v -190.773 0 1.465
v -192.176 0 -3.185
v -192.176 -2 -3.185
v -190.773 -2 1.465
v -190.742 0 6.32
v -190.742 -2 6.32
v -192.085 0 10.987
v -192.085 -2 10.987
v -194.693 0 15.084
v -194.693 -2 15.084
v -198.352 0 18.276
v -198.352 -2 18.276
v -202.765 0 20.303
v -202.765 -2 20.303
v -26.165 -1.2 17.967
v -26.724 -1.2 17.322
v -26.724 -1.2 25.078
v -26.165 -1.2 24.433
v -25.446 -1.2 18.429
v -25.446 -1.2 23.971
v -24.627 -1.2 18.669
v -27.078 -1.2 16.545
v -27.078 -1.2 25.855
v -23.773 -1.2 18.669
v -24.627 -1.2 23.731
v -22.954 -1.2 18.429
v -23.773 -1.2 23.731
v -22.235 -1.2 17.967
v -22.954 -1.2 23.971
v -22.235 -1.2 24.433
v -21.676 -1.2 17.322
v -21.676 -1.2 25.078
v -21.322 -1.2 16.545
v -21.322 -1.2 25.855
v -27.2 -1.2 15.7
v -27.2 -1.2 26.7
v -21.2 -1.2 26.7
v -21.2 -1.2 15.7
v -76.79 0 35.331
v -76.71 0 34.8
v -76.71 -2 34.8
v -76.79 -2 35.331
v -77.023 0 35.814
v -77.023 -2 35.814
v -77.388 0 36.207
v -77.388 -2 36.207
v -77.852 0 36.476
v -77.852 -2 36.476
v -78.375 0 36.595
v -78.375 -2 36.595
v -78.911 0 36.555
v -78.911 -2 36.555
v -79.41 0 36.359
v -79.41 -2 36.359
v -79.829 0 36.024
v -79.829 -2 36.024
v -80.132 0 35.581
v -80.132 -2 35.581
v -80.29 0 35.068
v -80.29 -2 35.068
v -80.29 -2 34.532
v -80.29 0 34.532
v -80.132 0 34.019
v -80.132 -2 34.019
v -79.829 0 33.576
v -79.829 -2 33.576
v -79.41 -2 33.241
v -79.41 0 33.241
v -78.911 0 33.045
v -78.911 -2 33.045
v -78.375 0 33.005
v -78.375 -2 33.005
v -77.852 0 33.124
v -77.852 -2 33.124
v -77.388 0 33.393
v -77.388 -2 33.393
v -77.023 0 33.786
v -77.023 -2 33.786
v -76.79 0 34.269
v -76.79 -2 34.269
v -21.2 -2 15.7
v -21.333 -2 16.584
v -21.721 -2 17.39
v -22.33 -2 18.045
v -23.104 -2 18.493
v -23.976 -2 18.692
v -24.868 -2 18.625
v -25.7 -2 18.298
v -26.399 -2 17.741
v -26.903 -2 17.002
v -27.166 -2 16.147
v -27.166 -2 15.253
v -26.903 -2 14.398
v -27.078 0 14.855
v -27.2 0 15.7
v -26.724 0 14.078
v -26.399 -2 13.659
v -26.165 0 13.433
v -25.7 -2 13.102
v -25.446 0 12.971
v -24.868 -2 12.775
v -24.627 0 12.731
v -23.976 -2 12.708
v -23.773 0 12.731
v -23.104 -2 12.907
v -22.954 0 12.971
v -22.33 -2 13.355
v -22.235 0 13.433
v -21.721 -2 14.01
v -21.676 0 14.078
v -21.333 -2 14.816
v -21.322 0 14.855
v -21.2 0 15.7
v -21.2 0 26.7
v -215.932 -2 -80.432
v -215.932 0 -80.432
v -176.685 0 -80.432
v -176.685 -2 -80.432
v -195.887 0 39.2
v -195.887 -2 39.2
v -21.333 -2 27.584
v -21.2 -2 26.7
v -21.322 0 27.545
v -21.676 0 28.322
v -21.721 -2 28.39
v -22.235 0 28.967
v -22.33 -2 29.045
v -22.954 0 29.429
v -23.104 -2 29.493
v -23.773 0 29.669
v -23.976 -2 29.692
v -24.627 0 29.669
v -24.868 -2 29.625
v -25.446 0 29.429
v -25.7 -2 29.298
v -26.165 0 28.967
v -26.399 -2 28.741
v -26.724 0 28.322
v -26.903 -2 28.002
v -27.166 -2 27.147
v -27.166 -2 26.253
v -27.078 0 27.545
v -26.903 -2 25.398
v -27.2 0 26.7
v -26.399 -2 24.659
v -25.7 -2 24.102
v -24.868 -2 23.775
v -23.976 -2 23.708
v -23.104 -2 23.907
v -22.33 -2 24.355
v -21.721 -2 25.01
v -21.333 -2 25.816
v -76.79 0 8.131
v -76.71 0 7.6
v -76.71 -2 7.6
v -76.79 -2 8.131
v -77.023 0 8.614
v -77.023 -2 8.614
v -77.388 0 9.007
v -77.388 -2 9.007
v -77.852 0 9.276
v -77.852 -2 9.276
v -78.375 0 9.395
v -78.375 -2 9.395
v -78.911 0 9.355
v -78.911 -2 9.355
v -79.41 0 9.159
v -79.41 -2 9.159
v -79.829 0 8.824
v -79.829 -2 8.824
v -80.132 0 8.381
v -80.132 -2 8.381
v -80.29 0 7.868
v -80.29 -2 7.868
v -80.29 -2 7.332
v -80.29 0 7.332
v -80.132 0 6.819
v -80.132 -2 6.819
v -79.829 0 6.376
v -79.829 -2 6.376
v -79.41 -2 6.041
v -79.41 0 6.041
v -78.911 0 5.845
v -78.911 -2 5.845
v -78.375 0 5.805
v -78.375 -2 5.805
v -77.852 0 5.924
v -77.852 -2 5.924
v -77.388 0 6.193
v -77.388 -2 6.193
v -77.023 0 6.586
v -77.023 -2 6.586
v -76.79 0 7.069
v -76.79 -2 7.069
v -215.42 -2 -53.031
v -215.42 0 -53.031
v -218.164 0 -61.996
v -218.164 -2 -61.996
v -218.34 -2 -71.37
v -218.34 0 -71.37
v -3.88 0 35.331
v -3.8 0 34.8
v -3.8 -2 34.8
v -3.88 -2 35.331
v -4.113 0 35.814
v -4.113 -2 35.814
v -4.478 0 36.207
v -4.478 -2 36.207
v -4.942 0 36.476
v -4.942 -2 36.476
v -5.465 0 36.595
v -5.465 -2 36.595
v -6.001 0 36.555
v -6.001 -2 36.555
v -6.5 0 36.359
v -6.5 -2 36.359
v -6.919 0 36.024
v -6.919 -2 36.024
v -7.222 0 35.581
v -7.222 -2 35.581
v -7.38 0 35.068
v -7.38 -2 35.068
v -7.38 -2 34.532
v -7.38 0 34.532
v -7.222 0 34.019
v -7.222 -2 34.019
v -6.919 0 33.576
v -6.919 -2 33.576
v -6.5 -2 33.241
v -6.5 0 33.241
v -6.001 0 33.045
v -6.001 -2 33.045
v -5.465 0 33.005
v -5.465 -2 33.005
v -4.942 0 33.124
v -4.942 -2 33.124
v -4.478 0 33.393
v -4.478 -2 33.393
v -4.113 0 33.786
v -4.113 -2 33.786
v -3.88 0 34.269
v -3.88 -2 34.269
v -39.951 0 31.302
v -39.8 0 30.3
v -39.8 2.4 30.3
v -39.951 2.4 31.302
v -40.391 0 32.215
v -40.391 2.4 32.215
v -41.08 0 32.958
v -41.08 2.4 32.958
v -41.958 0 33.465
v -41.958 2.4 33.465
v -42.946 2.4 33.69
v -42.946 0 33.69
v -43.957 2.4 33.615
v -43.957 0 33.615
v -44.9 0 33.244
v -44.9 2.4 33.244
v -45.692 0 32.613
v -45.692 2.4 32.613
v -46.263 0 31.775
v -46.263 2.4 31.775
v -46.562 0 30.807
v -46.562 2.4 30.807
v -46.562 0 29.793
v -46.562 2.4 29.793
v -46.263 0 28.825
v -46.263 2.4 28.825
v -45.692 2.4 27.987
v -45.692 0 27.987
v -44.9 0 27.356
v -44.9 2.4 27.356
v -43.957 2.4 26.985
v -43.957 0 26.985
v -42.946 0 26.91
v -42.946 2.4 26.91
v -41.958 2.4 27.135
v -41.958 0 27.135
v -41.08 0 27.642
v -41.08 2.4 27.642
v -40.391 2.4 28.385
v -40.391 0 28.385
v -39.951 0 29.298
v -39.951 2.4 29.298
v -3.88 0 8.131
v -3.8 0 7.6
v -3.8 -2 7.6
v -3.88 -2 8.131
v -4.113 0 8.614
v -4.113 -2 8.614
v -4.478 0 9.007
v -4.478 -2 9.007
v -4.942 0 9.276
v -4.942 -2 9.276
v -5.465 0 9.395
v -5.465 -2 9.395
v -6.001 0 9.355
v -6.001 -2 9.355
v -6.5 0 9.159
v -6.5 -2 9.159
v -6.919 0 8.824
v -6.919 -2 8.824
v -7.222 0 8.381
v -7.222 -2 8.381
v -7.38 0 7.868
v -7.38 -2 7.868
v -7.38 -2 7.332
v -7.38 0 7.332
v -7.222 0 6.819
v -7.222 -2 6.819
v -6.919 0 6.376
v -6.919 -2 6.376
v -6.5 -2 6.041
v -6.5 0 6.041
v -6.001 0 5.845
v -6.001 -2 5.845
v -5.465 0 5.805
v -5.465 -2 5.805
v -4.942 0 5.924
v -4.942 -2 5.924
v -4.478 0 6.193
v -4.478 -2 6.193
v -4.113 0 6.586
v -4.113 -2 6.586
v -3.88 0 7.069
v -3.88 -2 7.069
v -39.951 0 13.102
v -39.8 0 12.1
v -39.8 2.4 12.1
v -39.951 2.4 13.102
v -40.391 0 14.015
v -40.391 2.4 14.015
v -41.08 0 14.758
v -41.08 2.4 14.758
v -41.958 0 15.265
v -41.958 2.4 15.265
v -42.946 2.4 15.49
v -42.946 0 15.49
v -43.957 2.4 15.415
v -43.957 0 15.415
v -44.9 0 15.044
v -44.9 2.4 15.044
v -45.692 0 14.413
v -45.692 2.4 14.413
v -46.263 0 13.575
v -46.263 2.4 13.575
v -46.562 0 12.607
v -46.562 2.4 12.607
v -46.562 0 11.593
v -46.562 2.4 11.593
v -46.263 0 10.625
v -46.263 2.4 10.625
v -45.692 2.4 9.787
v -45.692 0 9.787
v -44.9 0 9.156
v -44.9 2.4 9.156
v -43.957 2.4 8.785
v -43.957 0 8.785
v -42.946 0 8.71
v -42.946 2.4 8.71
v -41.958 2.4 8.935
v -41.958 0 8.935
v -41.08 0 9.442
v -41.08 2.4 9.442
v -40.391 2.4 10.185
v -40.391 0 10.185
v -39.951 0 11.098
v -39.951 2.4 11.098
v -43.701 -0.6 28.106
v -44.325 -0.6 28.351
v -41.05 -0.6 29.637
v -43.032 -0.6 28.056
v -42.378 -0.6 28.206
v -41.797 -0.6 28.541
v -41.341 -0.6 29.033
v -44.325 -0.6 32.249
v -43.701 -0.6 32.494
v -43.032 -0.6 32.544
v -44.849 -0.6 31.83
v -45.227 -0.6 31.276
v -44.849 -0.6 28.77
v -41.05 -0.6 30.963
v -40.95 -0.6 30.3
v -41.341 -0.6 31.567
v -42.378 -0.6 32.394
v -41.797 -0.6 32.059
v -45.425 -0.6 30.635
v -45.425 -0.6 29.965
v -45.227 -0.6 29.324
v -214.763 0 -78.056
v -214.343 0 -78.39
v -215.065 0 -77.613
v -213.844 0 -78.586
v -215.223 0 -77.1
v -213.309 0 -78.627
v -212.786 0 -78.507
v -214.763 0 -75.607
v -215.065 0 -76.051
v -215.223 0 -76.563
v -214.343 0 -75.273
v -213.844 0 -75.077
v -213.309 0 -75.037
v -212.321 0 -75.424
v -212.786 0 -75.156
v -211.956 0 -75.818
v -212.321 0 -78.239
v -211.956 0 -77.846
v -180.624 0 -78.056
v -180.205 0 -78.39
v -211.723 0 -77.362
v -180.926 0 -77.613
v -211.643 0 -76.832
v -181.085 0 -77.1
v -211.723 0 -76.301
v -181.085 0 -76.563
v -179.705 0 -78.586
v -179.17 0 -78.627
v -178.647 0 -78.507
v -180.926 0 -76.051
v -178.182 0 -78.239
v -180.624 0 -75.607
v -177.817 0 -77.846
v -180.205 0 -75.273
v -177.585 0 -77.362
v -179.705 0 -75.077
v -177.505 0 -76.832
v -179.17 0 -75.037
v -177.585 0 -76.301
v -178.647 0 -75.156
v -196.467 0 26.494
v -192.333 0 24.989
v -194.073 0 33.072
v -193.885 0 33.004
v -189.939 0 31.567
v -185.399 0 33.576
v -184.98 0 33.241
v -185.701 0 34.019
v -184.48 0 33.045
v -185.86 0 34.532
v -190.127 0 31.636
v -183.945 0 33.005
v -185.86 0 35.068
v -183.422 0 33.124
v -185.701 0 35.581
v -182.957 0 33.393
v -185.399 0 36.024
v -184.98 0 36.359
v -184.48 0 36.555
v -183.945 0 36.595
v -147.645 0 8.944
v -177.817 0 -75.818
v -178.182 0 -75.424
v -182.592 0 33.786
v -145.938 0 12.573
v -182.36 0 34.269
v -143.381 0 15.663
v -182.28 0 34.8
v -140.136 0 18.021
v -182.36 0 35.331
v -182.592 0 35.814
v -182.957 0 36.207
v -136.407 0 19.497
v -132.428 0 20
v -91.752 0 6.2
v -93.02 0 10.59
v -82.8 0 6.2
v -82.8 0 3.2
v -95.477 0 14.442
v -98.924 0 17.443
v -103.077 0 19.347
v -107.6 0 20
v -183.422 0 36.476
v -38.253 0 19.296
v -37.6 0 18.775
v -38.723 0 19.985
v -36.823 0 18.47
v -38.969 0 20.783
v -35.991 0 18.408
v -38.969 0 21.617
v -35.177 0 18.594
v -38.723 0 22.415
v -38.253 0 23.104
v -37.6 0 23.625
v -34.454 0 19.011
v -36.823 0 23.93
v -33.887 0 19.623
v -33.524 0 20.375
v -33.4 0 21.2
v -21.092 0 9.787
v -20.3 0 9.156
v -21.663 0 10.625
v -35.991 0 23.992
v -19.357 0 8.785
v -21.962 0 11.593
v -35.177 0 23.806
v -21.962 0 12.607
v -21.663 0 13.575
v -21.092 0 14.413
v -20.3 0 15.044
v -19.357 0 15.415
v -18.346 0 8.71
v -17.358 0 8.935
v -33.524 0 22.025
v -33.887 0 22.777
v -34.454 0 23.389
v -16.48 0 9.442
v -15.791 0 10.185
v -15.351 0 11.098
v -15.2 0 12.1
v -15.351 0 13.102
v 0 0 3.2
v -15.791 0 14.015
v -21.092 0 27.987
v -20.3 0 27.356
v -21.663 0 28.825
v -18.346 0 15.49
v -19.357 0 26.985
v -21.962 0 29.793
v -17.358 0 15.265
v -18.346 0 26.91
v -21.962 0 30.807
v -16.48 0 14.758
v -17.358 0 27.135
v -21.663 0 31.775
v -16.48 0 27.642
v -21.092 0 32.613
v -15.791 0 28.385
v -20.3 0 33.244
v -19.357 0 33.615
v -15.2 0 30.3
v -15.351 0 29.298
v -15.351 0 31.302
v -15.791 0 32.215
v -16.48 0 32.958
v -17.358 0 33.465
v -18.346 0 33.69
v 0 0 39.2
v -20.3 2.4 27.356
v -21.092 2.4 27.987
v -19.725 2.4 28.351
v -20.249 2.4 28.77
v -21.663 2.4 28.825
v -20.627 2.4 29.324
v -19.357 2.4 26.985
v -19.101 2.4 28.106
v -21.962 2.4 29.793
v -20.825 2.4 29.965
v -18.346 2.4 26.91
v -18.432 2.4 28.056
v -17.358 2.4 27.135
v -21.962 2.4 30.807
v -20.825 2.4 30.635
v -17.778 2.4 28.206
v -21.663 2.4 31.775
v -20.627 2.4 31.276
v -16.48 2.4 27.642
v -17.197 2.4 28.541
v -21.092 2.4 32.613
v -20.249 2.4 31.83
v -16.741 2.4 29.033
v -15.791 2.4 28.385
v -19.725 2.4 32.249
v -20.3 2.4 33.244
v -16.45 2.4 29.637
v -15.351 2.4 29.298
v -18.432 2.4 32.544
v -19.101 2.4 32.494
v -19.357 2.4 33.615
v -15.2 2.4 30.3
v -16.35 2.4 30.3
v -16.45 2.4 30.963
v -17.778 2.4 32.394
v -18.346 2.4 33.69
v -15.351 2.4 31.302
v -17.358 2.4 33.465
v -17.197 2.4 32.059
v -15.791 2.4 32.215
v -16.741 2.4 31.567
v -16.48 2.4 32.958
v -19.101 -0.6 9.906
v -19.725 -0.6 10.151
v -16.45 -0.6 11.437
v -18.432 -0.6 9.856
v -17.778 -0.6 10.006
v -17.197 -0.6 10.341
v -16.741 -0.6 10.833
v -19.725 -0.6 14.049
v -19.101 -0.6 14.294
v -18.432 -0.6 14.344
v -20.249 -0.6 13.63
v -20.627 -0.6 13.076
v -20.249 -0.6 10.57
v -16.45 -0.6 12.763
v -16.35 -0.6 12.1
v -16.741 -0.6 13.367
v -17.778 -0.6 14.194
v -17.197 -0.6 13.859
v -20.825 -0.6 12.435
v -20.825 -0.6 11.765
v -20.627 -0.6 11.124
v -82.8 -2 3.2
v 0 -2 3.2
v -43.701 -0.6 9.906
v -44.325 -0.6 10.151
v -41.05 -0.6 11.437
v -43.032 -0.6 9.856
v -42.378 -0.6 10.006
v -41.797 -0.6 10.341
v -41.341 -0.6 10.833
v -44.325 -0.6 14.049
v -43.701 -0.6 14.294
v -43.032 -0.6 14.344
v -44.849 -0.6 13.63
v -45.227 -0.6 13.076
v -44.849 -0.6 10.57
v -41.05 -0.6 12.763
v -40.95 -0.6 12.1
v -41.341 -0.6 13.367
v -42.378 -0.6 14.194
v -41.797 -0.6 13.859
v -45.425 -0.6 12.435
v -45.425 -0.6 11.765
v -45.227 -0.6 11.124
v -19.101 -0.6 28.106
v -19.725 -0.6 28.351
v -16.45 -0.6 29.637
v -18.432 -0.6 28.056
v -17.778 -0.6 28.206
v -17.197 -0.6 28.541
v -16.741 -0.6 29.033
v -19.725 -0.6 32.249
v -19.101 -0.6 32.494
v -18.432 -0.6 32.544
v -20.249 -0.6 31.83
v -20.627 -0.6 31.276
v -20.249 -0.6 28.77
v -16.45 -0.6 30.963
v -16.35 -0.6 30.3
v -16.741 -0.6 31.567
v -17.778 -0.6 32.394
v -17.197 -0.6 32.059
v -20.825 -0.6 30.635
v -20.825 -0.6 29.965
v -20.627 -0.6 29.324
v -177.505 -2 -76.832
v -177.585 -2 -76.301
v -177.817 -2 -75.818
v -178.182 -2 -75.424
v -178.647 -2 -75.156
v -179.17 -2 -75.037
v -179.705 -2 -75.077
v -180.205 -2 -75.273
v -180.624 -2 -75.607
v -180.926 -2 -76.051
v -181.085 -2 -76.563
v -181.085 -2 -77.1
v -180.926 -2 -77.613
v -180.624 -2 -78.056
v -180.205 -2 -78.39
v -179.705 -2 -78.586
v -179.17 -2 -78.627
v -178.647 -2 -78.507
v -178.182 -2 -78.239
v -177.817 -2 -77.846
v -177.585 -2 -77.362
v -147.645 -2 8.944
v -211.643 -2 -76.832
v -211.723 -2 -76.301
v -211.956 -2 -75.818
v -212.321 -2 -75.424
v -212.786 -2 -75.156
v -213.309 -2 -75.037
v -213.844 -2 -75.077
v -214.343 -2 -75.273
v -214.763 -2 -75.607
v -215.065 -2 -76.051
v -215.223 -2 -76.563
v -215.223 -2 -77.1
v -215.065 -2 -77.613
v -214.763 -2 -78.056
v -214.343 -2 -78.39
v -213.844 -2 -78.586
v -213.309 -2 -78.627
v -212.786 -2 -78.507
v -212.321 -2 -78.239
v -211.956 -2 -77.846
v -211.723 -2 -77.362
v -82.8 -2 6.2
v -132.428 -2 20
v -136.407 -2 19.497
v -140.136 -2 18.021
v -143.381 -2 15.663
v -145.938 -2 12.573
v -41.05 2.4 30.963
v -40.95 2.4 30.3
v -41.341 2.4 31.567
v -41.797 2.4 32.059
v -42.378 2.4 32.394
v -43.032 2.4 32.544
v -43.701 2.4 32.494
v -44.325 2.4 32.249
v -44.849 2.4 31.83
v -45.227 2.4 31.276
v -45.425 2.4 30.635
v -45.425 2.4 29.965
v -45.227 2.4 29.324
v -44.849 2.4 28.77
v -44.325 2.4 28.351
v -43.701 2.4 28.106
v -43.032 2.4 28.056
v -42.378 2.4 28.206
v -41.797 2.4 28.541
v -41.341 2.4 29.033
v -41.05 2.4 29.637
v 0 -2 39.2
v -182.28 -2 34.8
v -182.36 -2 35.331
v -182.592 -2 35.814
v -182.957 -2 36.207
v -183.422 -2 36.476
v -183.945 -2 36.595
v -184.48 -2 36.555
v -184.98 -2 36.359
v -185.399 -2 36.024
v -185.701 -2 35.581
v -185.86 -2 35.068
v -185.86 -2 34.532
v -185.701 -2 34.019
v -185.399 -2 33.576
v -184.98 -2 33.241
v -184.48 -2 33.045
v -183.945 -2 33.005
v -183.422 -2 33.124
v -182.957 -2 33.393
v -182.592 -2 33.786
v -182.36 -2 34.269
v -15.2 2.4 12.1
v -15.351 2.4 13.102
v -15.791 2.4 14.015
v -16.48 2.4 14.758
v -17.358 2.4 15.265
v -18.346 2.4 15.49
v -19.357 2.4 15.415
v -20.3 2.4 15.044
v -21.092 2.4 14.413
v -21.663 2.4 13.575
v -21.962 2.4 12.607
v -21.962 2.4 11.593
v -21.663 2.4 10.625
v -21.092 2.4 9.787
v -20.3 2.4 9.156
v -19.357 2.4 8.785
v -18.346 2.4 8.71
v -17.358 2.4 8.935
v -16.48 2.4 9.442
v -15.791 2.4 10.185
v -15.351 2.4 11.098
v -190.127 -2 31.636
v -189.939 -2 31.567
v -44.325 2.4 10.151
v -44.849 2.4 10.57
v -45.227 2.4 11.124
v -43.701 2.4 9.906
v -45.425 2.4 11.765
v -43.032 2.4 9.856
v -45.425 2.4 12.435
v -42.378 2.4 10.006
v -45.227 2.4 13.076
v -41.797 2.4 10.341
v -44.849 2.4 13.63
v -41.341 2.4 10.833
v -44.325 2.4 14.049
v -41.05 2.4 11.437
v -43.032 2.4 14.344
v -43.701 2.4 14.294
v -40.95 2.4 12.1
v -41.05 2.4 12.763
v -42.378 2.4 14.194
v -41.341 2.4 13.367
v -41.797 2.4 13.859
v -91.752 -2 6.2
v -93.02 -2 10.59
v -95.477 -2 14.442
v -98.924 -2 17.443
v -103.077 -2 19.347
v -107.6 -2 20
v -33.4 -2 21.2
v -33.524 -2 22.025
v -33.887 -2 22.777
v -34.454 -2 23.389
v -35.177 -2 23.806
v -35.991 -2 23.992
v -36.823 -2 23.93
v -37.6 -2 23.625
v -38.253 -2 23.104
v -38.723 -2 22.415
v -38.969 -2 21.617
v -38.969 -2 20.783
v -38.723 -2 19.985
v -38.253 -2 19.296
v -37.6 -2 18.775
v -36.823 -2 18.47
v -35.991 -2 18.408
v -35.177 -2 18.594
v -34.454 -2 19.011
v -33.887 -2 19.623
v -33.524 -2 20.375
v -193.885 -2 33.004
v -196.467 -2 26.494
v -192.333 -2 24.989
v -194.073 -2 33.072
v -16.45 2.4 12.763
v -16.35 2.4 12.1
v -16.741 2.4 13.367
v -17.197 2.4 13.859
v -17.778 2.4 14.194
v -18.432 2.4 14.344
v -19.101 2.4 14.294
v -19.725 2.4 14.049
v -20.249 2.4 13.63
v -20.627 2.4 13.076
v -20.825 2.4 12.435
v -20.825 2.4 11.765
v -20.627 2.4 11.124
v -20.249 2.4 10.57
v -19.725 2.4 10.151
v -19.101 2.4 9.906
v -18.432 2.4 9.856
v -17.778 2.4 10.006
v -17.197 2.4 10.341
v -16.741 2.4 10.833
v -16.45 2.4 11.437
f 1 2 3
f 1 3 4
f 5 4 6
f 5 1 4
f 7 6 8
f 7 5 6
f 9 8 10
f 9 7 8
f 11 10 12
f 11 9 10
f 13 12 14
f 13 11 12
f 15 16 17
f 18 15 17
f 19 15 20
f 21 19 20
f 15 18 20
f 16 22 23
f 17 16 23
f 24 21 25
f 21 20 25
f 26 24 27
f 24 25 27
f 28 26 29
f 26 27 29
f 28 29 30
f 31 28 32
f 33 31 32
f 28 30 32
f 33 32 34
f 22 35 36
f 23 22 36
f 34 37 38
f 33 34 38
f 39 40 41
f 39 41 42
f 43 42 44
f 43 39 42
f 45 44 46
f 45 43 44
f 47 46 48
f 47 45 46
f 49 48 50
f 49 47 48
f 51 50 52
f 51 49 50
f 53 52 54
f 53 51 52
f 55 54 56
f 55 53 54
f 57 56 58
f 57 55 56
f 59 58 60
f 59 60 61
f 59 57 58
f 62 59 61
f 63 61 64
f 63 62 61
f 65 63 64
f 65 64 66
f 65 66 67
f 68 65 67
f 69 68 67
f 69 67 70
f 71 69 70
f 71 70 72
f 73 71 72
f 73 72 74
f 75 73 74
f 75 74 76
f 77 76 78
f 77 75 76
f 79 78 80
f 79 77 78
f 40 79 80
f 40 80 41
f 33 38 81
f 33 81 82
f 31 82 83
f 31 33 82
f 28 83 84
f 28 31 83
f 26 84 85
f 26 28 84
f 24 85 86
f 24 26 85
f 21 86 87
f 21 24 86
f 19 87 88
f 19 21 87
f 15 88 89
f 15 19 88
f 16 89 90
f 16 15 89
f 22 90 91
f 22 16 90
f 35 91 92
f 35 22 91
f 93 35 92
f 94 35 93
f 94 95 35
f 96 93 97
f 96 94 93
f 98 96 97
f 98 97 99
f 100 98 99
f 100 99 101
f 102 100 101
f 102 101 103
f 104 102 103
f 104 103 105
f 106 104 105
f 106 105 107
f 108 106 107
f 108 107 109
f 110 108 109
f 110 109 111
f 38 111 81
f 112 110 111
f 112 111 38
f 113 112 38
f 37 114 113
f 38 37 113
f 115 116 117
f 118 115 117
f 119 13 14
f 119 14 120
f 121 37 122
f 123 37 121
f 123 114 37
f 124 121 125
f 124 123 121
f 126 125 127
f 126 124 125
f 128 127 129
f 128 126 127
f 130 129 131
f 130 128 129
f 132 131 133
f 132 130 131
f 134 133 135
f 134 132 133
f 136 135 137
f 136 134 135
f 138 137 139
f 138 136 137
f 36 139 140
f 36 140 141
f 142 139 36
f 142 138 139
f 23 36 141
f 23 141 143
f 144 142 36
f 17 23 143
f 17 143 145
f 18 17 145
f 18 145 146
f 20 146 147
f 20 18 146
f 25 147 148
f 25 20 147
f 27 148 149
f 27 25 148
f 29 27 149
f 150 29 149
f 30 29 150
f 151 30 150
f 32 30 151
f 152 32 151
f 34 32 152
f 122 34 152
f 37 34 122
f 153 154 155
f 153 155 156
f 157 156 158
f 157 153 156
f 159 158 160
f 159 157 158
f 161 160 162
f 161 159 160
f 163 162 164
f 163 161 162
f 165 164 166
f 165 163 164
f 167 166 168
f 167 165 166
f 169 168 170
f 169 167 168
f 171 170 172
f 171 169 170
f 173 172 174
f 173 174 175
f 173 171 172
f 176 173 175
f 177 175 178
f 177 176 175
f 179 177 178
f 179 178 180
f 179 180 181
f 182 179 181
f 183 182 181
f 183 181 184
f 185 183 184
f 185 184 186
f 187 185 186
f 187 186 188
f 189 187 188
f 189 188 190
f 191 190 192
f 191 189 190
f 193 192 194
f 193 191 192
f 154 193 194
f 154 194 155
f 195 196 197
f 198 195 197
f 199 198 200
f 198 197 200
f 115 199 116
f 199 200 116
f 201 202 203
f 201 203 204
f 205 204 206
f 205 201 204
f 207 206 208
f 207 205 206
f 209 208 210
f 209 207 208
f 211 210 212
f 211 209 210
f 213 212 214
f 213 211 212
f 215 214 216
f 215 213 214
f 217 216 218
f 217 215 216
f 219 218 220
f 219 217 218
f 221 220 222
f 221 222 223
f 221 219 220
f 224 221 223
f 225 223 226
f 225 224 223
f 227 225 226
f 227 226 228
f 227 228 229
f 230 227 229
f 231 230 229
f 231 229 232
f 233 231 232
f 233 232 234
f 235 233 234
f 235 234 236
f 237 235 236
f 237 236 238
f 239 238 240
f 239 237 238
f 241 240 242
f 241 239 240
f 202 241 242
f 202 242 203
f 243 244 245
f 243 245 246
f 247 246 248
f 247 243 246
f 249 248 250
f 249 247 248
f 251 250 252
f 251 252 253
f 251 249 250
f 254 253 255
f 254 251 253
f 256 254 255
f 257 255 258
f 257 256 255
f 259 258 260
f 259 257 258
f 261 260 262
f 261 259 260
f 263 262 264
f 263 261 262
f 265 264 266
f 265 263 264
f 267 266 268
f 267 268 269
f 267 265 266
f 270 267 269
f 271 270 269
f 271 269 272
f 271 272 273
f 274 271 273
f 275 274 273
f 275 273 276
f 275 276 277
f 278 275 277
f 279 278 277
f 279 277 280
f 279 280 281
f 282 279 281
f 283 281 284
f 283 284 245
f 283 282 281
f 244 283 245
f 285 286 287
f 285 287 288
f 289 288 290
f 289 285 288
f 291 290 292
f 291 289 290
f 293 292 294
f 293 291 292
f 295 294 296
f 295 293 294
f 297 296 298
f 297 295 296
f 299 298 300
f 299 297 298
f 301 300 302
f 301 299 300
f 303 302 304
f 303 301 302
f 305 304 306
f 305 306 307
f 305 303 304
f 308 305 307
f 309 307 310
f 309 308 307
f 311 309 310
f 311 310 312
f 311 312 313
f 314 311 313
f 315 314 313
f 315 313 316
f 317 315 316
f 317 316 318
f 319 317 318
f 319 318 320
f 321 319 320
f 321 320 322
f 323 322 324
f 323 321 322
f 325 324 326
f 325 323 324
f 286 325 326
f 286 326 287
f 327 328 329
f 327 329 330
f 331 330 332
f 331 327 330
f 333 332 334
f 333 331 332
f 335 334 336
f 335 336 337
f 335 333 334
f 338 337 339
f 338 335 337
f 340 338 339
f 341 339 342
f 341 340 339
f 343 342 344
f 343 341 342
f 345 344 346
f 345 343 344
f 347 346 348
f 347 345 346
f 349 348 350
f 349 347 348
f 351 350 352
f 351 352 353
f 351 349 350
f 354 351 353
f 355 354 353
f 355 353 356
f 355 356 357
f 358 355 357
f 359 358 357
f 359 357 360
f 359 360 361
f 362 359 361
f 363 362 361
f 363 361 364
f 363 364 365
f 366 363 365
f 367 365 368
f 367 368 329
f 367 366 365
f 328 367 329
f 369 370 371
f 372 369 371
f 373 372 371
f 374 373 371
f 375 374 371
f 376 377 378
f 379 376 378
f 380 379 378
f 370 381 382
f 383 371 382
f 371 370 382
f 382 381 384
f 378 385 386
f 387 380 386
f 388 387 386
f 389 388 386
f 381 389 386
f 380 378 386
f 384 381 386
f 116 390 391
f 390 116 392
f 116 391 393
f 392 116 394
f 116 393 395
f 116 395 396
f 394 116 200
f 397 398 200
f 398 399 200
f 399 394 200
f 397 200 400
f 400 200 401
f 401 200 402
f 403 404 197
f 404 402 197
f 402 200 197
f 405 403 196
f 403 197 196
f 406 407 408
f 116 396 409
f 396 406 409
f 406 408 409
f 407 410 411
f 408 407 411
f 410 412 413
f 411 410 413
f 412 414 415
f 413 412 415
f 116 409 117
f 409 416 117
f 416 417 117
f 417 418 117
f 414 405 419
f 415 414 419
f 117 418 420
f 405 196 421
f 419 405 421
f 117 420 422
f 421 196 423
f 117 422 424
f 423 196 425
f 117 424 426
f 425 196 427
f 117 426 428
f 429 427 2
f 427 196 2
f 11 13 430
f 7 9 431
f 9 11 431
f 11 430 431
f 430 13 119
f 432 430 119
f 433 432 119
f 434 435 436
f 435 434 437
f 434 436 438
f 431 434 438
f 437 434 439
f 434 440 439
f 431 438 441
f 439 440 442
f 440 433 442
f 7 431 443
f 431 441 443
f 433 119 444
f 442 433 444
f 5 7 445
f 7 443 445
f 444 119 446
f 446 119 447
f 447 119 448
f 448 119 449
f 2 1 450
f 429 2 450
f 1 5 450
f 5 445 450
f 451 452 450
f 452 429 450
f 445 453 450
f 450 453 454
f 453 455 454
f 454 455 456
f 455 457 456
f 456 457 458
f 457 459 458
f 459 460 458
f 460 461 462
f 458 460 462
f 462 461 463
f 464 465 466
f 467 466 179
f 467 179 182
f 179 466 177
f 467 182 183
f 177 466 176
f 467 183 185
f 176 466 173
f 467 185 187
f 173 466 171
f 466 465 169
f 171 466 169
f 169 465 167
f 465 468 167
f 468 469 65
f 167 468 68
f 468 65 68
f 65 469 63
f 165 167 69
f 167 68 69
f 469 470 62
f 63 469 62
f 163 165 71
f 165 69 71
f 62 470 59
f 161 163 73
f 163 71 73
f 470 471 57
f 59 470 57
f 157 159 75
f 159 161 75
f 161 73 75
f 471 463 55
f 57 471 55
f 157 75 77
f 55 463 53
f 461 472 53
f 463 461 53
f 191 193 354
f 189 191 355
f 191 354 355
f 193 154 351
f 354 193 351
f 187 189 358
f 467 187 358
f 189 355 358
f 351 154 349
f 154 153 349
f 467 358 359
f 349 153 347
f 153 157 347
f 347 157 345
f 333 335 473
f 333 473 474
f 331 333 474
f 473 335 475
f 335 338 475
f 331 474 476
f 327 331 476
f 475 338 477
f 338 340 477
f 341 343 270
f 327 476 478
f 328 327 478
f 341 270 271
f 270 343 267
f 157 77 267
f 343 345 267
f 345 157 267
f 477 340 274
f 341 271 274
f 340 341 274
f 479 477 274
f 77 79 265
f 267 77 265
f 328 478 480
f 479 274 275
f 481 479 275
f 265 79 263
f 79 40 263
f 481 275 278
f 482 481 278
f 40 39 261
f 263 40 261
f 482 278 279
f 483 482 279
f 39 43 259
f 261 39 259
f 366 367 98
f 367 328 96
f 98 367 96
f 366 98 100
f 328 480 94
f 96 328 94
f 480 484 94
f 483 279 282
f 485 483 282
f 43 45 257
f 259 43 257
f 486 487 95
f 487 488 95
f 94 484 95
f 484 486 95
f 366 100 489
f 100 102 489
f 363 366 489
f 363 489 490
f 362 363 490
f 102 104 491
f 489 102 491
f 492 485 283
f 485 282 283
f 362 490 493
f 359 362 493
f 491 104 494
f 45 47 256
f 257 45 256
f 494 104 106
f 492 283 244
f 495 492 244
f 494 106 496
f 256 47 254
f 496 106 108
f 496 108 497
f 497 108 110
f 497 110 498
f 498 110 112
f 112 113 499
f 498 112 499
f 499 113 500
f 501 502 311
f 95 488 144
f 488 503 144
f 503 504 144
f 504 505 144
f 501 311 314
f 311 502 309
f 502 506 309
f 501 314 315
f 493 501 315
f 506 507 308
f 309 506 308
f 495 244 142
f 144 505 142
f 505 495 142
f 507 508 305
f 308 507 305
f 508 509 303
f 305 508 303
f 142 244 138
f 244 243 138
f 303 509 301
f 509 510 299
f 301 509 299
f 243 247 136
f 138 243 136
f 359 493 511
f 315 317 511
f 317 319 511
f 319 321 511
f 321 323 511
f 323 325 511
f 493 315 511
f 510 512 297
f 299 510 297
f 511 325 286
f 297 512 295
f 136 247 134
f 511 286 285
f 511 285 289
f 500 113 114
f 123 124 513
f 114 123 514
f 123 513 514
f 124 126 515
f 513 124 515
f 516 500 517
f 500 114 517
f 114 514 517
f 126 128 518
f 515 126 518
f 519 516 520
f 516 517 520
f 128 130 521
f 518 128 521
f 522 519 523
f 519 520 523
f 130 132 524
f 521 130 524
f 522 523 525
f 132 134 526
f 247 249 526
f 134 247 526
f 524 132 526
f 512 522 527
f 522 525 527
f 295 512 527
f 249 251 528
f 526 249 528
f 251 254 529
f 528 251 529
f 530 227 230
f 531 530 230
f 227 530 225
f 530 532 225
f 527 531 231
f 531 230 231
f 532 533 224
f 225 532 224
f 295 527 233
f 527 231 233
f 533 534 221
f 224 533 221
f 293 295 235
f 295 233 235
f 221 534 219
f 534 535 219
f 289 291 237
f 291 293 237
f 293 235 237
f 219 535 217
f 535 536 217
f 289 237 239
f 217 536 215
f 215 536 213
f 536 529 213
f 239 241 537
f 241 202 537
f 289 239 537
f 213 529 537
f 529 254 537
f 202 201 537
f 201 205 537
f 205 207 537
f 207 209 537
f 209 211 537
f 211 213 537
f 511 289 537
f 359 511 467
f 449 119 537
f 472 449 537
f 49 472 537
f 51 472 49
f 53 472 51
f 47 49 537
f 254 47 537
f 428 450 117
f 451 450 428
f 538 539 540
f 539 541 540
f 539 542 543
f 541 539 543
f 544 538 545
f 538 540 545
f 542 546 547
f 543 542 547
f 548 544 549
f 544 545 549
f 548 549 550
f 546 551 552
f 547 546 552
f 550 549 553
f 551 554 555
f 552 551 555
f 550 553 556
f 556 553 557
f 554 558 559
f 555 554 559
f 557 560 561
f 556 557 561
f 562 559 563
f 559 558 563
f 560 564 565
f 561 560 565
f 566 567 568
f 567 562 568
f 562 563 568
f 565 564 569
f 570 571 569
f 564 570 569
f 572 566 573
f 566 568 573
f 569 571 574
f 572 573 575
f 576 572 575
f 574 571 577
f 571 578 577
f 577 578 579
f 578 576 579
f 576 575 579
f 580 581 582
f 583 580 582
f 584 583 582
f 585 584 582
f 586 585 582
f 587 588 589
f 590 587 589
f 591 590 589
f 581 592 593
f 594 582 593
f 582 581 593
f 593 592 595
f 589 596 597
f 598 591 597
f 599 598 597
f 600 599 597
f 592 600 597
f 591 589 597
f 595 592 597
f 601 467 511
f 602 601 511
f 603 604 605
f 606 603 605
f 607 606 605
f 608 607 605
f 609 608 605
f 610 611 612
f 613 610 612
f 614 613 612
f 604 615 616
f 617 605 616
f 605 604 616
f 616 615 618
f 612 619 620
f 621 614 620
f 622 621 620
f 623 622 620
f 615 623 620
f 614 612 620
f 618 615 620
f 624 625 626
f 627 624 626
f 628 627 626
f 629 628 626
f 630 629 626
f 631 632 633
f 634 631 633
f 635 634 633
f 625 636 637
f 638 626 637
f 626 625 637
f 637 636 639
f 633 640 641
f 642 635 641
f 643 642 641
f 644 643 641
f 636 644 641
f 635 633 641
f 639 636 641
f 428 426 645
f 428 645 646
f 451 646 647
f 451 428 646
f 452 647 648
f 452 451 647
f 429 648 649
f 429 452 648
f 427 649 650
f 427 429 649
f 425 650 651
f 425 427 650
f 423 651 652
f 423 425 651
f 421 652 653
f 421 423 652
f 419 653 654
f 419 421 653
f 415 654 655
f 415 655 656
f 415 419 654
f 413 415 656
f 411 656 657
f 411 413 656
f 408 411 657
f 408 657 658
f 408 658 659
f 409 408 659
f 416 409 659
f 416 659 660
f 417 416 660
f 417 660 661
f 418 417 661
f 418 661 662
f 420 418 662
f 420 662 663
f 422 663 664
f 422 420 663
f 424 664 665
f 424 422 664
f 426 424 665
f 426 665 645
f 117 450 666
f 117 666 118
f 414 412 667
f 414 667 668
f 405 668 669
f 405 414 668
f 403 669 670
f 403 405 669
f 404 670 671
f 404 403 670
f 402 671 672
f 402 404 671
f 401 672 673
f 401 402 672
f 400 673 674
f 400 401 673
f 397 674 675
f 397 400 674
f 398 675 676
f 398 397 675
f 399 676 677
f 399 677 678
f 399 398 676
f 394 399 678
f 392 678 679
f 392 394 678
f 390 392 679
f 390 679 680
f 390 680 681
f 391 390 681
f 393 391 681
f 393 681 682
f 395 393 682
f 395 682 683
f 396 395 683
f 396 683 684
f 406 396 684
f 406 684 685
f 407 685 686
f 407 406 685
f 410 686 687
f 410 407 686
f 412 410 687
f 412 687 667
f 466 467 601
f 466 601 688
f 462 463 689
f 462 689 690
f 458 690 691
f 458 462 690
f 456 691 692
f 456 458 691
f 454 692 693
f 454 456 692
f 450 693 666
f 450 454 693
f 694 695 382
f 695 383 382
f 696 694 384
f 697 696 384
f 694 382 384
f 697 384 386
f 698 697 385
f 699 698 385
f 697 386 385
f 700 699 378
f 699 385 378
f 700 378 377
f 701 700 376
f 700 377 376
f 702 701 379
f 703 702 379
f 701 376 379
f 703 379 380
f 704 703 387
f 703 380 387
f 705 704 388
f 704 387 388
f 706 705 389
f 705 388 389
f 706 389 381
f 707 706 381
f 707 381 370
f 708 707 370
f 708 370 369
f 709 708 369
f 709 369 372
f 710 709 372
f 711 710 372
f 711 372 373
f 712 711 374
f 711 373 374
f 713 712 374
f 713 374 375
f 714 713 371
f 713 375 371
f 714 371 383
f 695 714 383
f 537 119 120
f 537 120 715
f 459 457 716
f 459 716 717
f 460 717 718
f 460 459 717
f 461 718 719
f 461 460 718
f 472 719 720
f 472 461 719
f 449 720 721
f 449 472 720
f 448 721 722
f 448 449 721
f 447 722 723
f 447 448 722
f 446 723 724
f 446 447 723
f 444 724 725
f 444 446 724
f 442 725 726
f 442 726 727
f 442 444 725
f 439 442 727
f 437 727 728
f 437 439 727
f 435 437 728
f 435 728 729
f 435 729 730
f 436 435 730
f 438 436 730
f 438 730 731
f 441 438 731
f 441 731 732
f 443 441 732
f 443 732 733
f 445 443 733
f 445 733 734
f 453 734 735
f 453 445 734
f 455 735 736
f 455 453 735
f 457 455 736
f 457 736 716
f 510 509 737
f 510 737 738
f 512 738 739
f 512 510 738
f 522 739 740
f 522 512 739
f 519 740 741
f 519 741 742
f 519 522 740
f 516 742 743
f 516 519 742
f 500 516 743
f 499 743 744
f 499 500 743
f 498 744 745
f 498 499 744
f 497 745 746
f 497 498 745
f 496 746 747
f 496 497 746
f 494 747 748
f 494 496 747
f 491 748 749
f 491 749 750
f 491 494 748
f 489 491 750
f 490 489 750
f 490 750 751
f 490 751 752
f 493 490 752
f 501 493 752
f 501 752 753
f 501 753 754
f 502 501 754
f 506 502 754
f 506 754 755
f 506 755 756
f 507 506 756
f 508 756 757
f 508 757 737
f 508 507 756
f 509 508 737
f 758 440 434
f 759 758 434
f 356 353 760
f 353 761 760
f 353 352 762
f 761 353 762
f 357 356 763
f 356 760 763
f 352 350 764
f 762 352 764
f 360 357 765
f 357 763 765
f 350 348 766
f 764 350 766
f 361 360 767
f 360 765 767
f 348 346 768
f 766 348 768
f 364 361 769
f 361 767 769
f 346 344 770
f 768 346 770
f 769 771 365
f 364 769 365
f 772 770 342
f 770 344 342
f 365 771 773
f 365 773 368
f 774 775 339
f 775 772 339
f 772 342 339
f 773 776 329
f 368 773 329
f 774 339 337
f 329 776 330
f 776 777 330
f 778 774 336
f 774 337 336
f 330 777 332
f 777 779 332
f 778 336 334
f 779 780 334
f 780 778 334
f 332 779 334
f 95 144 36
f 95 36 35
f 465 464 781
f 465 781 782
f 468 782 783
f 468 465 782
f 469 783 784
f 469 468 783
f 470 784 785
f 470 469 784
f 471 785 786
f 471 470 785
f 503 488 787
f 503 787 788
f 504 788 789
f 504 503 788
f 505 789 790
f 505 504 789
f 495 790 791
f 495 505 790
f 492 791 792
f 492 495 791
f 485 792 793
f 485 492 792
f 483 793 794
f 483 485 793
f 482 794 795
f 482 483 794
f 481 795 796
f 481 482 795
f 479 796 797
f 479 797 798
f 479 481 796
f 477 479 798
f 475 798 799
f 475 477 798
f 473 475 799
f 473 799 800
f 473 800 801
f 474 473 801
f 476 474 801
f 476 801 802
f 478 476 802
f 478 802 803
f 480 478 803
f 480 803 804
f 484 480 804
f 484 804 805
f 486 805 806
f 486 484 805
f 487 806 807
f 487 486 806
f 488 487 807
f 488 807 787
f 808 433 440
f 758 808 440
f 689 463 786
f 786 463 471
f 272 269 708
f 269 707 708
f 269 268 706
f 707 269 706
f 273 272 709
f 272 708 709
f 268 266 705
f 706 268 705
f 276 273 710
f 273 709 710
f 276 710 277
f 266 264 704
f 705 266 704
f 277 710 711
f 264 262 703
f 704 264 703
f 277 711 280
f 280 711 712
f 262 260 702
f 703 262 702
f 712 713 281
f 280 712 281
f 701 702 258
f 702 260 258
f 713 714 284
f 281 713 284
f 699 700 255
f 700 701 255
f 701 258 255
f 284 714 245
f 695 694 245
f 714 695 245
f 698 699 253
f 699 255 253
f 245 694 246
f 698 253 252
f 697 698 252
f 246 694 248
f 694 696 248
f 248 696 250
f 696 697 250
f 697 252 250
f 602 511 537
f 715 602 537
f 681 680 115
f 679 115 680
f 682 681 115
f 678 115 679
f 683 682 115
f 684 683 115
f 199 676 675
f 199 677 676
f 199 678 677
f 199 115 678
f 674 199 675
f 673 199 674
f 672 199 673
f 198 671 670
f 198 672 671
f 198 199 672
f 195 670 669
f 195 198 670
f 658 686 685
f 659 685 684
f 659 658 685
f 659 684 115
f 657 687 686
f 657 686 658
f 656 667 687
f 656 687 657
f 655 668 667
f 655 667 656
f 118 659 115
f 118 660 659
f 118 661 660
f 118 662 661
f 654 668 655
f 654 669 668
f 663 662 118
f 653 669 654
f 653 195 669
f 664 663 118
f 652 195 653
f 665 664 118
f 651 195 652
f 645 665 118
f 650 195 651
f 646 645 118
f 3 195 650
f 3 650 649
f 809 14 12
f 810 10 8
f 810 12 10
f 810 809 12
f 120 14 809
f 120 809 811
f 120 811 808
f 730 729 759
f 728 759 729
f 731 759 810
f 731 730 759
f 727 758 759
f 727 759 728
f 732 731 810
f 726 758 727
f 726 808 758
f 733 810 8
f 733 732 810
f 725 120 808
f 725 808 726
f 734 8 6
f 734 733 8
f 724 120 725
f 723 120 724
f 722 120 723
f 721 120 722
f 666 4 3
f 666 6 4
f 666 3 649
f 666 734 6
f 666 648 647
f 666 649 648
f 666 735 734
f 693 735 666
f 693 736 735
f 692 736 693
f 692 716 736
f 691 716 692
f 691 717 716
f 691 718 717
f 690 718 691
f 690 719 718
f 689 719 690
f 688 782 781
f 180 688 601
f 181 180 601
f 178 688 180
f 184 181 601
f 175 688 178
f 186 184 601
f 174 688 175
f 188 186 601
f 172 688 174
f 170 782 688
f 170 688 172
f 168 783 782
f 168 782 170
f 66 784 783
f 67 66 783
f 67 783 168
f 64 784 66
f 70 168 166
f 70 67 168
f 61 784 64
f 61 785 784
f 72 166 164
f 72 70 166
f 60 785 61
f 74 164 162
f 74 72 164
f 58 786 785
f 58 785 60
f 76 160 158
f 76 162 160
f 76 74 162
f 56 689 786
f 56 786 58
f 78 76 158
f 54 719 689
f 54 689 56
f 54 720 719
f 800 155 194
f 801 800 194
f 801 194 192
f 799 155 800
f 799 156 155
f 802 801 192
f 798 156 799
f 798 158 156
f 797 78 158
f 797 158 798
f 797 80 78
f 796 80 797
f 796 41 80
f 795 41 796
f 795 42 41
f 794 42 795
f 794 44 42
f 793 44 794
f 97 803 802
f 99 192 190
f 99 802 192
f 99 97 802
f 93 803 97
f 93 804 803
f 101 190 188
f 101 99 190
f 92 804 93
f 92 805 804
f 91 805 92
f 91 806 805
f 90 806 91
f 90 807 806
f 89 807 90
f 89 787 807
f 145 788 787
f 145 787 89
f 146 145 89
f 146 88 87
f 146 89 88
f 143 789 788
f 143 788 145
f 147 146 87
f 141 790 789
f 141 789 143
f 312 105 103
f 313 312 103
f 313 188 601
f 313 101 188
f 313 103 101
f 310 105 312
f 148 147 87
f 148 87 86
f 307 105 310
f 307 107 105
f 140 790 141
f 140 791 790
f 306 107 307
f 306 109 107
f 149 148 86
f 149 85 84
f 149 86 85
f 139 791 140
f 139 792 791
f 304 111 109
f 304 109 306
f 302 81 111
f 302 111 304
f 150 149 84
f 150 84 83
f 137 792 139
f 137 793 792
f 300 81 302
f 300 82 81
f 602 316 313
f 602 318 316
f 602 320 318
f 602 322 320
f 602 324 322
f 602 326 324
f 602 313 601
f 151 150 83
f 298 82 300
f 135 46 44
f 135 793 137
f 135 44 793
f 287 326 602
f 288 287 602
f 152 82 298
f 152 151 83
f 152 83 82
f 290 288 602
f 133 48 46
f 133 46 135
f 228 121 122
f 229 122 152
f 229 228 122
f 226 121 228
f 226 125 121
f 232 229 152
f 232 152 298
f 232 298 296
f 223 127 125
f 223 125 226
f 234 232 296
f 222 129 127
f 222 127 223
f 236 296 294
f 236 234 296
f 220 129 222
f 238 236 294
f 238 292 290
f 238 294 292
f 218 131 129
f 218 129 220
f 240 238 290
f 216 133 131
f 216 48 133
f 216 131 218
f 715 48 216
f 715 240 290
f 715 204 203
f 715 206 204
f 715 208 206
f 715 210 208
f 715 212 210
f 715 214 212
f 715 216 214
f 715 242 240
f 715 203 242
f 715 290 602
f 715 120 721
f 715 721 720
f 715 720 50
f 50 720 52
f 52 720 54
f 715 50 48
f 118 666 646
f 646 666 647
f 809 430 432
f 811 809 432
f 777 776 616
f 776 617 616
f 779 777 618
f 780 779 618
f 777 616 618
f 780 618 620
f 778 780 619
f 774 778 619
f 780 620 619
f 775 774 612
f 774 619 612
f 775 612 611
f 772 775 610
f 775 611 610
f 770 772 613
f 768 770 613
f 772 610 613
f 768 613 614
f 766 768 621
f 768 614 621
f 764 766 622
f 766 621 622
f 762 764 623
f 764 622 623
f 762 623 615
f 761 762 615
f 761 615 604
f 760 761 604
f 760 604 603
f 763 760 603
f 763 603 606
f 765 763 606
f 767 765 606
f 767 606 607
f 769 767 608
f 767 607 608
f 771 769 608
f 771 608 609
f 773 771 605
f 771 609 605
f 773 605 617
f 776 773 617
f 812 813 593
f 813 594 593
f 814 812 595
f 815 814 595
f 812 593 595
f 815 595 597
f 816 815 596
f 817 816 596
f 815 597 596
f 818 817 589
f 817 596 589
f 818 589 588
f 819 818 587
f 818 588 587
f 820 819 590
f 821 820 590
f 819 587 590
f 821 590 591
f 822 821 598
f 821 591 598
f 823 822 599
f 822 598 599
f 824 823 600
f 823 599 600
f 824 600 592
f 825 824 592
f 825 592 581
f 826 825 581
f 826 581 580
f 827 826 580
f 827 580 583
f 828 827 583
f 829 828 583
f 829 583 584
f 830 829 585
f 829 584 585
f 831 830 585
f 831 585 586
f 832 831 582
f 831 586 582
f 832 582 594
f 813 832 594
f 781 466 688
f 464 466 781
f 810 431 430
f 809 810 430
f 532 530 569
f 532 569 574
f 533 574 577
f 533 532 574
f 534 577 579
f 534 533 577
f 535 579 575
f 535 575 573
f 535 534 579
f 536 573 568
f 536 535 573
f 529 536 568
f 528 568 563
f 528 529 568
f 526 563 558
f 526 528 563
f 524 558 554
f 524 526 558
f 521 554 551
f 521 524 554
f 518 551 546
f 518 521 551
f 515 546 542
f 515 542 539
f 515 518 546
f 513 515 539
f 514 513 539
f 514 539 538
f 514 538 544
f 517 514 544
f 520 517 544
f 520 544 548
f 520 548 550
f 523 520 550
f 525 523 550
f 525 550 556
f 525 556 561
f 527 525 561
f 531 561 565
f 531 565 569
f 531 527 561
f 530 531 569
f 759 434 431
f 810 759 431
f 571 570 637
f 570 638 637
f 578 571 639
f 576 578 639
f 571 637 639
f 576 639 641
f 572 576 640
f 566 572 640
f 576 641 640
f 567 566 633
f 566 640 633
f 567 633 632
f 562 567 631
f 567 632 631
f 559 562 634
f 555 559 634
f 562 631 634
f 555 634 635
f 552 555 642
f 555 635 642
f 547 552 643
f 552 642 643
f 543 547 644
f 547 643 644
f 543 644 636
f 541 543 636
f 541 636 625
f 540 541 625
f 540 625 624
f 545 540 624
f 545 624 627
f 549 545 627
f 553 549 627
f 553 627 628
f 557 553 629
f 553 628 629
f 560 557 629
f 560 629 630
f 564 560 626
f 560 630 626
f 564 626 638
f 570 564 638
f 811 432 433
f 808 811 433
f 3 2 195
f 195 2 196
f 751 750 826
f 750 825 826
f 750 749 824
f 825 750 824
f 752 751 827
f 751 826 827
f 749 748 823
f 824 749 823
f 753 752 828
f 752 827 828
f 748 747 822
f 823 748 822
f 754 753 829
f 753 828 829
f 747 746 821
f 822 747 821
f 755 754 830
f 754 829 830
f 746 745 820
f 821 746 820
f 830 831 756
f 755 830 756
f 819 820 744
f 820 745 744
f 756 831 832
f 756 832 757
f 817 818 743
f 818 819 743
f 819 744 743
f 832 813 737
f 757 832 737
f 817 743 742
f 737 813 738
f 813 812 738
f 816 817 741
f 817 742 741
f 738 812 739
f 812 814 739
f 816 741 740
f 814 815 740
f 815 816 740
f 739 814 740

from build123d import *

# Parameters (mm, degrees)
SKETCH080_R           = 2.25
EXTRUDE081_DEPTH      = 0.6
EXTRUDE081_DEPTH_BACK = 2.4
SKETCH081_R           = 3.4
EXTRUDE080_DEPTH      = 2.4
EXTRUDE079_DEPTH      = 1.2
SKETCH075_R           = 1.8
SKETCH075_R_2         = 2.8
SKETCH075_R_3         = 3
EXTRUDE078_DEPTH      = 2


with BuildPart() as extrude081:
    # Sketch080 → Extrude081 (new body, two sides)
    with BuildSketch(Plane.XZ) as extrude081_sk:
        with Locations((-18.6, 12.1)):
            Circle(SKETCH080_R)
        with Locations((-18.6, 30.3)):
            Circle(SKETCH080_R)
        with Locations((-43.2, 30.3)):
            Circle(SKETCH080_R)
        with Locations((-43.2, 12.1)):
            Circle(SKETCH080_R)
    extrude(amount=EXTRUDE081_DEPTH)
    extrude(extrude081_sk.sketch, amount=-EXTRUDE081_DEPTH_BACK)


with BuildPart() as extrude080:
    # Sketch081 → Extrude080 (new body)
    with BuildSketch(Plane.XZ):
        with Locations((-43.2, 30.3)):
            Circle(SKETCH081_R)
        with Locations((-18.6, 30.3)):
            Circle(SKETCH081_R)
        with Locations((-43.2, 12.1)):
            Circle(SKETCH081_R)
        with Locations((-18.6, 12.1)):
            Circle(SKETCH081_R)
    extrude(amount=-EXTRUDE080_DEPTH)


with BuildPart() as extrude_lato_dx_pistola_scavi_pulsanti:
    # Sketch077 → Extrude079 (new body)
    with BuildSketch(Plane.XZ):
        with BuildLine():
            Line((-27.2, 26.7), (-27.2, 15.7))
            ThreePointArc((-27.2, 15.7), (-24.2, 12.7), (-21.2, 15.7))
            Line((-21.2, 26.700018), (-21.2, 15.7))
            ThreePointArc((-21.2, 26.700018), (-24.200009, 29.7), (-27.2, 26.7))
        make_face()
    extrude(amount=EXTRUDE079_DEPTH)


with BuildPart() as cut046:
    # Sketch075 → Extrude078 (new body)
    with BuildSketch(Plane.XZ):
        with BuildLine():
            Line((-82.8, 3.2), (0, 3.2))
            Line((0, 3.2), (0, 39.2))
            Line((-195.886839, 39.2), (0, 39.2))
            Line((-202.764796, 20.302968), (-195.886839, 39.2))
            ThreePointArc((-192.175575, -3.18451), (-192.085048, 10.987093), (-202.764796, 20.302968))
            Line((-192.175575, -3.18451), (-215.419579, -53.031439))
            ThreePointArc((-215.419579, -53.031439), (-218.578907, -66.677212), (-215.93199, -80.431568))
            Line((-215.93199, -80.431568), (-176.68528, -80.431568))
            Line((-147.645309, 8.944272), (-176.68528, -80.431568))
            ThreePointArc((-132.428405, 20), (-141.832969, 16.944272), (-147.645309, 8.944272))
            Line((-132.428405, 20), (-107.6, 20))
            ThreePointArc((-91.751972, 6.2), (-97.09286, 16.066483), (-107.6, 20))
            Line((-82.8, 6.2), (-91.751972, 6.2))
            Line((-82.8, 3.2), (-82.8, 6.2))
        make_face()
        with Locations((-213.443268, -76.831568)):
            Circle(SKETCH075_R, mode=Mode.SUBTRACT)
        with Locations((-179.304663, -76.831568)):
            Circle(SKETCH075_R, mode=Mode.SUBTRACT)
        with Locations((-184.079668, 34.8)):
            Circle(SKETCH075_R, mode=Mode.SUBTRACT)
        with Locations((-78.51, 34.8)):
            Circle(SKETCH075_R, mode=Mode.SUBTRACT)
        with Locations((-78.51, 7.6)):
            Circle(SKETCH075_R, mode=Mode.SUBTRACT)
        with Locations((-5.6, 34.8)):
            Circle(SKETCH075_R, mode=Mode.SUBTRACT)
        with Locations((-5.6, 7.6)):
            Circle(SKETCH075_R, mode=Mode.SUBTRACT)
        with Locations((-36.2, 21.2)):
            Circle(SKETCH075_R_2, mode=Mode.SUBTRACT)
        with Locations((-24.2, 26.7)):
            Circle(SKETCH075_R_3, mode=Mode.SUBTRACT)
        with Locations((-24.2, 15.7)):
            Circle(SKETCH075_R_3, mode=Mode.SUBTRACT)
        Polygon((-189.938695, 31.567195), (-192.332836, 24.989347), (-196.467483, 26.494236), (-194.073342, 33.072084), (-193.885404, 33.00368), (-190.126633, 31.635599), align=None, mode=Mode.SUBTRACT)
    extrude(amount=EXTRUDE078_DEPTH)

    # Cut045: cut Extrude lato dx pistola - scavi pulsanti
    add(extrude_lato_dx_pistola_scavi_pulsanti.part, mode=Mode.SUBTRACT)

    # Fusion004: union Extrude080
    add(extrude080.part)

    # Cut046: cut Extrude081
    add(extrude081.part, mode=Mode.SUBTRACT)


solid = cut046.part
